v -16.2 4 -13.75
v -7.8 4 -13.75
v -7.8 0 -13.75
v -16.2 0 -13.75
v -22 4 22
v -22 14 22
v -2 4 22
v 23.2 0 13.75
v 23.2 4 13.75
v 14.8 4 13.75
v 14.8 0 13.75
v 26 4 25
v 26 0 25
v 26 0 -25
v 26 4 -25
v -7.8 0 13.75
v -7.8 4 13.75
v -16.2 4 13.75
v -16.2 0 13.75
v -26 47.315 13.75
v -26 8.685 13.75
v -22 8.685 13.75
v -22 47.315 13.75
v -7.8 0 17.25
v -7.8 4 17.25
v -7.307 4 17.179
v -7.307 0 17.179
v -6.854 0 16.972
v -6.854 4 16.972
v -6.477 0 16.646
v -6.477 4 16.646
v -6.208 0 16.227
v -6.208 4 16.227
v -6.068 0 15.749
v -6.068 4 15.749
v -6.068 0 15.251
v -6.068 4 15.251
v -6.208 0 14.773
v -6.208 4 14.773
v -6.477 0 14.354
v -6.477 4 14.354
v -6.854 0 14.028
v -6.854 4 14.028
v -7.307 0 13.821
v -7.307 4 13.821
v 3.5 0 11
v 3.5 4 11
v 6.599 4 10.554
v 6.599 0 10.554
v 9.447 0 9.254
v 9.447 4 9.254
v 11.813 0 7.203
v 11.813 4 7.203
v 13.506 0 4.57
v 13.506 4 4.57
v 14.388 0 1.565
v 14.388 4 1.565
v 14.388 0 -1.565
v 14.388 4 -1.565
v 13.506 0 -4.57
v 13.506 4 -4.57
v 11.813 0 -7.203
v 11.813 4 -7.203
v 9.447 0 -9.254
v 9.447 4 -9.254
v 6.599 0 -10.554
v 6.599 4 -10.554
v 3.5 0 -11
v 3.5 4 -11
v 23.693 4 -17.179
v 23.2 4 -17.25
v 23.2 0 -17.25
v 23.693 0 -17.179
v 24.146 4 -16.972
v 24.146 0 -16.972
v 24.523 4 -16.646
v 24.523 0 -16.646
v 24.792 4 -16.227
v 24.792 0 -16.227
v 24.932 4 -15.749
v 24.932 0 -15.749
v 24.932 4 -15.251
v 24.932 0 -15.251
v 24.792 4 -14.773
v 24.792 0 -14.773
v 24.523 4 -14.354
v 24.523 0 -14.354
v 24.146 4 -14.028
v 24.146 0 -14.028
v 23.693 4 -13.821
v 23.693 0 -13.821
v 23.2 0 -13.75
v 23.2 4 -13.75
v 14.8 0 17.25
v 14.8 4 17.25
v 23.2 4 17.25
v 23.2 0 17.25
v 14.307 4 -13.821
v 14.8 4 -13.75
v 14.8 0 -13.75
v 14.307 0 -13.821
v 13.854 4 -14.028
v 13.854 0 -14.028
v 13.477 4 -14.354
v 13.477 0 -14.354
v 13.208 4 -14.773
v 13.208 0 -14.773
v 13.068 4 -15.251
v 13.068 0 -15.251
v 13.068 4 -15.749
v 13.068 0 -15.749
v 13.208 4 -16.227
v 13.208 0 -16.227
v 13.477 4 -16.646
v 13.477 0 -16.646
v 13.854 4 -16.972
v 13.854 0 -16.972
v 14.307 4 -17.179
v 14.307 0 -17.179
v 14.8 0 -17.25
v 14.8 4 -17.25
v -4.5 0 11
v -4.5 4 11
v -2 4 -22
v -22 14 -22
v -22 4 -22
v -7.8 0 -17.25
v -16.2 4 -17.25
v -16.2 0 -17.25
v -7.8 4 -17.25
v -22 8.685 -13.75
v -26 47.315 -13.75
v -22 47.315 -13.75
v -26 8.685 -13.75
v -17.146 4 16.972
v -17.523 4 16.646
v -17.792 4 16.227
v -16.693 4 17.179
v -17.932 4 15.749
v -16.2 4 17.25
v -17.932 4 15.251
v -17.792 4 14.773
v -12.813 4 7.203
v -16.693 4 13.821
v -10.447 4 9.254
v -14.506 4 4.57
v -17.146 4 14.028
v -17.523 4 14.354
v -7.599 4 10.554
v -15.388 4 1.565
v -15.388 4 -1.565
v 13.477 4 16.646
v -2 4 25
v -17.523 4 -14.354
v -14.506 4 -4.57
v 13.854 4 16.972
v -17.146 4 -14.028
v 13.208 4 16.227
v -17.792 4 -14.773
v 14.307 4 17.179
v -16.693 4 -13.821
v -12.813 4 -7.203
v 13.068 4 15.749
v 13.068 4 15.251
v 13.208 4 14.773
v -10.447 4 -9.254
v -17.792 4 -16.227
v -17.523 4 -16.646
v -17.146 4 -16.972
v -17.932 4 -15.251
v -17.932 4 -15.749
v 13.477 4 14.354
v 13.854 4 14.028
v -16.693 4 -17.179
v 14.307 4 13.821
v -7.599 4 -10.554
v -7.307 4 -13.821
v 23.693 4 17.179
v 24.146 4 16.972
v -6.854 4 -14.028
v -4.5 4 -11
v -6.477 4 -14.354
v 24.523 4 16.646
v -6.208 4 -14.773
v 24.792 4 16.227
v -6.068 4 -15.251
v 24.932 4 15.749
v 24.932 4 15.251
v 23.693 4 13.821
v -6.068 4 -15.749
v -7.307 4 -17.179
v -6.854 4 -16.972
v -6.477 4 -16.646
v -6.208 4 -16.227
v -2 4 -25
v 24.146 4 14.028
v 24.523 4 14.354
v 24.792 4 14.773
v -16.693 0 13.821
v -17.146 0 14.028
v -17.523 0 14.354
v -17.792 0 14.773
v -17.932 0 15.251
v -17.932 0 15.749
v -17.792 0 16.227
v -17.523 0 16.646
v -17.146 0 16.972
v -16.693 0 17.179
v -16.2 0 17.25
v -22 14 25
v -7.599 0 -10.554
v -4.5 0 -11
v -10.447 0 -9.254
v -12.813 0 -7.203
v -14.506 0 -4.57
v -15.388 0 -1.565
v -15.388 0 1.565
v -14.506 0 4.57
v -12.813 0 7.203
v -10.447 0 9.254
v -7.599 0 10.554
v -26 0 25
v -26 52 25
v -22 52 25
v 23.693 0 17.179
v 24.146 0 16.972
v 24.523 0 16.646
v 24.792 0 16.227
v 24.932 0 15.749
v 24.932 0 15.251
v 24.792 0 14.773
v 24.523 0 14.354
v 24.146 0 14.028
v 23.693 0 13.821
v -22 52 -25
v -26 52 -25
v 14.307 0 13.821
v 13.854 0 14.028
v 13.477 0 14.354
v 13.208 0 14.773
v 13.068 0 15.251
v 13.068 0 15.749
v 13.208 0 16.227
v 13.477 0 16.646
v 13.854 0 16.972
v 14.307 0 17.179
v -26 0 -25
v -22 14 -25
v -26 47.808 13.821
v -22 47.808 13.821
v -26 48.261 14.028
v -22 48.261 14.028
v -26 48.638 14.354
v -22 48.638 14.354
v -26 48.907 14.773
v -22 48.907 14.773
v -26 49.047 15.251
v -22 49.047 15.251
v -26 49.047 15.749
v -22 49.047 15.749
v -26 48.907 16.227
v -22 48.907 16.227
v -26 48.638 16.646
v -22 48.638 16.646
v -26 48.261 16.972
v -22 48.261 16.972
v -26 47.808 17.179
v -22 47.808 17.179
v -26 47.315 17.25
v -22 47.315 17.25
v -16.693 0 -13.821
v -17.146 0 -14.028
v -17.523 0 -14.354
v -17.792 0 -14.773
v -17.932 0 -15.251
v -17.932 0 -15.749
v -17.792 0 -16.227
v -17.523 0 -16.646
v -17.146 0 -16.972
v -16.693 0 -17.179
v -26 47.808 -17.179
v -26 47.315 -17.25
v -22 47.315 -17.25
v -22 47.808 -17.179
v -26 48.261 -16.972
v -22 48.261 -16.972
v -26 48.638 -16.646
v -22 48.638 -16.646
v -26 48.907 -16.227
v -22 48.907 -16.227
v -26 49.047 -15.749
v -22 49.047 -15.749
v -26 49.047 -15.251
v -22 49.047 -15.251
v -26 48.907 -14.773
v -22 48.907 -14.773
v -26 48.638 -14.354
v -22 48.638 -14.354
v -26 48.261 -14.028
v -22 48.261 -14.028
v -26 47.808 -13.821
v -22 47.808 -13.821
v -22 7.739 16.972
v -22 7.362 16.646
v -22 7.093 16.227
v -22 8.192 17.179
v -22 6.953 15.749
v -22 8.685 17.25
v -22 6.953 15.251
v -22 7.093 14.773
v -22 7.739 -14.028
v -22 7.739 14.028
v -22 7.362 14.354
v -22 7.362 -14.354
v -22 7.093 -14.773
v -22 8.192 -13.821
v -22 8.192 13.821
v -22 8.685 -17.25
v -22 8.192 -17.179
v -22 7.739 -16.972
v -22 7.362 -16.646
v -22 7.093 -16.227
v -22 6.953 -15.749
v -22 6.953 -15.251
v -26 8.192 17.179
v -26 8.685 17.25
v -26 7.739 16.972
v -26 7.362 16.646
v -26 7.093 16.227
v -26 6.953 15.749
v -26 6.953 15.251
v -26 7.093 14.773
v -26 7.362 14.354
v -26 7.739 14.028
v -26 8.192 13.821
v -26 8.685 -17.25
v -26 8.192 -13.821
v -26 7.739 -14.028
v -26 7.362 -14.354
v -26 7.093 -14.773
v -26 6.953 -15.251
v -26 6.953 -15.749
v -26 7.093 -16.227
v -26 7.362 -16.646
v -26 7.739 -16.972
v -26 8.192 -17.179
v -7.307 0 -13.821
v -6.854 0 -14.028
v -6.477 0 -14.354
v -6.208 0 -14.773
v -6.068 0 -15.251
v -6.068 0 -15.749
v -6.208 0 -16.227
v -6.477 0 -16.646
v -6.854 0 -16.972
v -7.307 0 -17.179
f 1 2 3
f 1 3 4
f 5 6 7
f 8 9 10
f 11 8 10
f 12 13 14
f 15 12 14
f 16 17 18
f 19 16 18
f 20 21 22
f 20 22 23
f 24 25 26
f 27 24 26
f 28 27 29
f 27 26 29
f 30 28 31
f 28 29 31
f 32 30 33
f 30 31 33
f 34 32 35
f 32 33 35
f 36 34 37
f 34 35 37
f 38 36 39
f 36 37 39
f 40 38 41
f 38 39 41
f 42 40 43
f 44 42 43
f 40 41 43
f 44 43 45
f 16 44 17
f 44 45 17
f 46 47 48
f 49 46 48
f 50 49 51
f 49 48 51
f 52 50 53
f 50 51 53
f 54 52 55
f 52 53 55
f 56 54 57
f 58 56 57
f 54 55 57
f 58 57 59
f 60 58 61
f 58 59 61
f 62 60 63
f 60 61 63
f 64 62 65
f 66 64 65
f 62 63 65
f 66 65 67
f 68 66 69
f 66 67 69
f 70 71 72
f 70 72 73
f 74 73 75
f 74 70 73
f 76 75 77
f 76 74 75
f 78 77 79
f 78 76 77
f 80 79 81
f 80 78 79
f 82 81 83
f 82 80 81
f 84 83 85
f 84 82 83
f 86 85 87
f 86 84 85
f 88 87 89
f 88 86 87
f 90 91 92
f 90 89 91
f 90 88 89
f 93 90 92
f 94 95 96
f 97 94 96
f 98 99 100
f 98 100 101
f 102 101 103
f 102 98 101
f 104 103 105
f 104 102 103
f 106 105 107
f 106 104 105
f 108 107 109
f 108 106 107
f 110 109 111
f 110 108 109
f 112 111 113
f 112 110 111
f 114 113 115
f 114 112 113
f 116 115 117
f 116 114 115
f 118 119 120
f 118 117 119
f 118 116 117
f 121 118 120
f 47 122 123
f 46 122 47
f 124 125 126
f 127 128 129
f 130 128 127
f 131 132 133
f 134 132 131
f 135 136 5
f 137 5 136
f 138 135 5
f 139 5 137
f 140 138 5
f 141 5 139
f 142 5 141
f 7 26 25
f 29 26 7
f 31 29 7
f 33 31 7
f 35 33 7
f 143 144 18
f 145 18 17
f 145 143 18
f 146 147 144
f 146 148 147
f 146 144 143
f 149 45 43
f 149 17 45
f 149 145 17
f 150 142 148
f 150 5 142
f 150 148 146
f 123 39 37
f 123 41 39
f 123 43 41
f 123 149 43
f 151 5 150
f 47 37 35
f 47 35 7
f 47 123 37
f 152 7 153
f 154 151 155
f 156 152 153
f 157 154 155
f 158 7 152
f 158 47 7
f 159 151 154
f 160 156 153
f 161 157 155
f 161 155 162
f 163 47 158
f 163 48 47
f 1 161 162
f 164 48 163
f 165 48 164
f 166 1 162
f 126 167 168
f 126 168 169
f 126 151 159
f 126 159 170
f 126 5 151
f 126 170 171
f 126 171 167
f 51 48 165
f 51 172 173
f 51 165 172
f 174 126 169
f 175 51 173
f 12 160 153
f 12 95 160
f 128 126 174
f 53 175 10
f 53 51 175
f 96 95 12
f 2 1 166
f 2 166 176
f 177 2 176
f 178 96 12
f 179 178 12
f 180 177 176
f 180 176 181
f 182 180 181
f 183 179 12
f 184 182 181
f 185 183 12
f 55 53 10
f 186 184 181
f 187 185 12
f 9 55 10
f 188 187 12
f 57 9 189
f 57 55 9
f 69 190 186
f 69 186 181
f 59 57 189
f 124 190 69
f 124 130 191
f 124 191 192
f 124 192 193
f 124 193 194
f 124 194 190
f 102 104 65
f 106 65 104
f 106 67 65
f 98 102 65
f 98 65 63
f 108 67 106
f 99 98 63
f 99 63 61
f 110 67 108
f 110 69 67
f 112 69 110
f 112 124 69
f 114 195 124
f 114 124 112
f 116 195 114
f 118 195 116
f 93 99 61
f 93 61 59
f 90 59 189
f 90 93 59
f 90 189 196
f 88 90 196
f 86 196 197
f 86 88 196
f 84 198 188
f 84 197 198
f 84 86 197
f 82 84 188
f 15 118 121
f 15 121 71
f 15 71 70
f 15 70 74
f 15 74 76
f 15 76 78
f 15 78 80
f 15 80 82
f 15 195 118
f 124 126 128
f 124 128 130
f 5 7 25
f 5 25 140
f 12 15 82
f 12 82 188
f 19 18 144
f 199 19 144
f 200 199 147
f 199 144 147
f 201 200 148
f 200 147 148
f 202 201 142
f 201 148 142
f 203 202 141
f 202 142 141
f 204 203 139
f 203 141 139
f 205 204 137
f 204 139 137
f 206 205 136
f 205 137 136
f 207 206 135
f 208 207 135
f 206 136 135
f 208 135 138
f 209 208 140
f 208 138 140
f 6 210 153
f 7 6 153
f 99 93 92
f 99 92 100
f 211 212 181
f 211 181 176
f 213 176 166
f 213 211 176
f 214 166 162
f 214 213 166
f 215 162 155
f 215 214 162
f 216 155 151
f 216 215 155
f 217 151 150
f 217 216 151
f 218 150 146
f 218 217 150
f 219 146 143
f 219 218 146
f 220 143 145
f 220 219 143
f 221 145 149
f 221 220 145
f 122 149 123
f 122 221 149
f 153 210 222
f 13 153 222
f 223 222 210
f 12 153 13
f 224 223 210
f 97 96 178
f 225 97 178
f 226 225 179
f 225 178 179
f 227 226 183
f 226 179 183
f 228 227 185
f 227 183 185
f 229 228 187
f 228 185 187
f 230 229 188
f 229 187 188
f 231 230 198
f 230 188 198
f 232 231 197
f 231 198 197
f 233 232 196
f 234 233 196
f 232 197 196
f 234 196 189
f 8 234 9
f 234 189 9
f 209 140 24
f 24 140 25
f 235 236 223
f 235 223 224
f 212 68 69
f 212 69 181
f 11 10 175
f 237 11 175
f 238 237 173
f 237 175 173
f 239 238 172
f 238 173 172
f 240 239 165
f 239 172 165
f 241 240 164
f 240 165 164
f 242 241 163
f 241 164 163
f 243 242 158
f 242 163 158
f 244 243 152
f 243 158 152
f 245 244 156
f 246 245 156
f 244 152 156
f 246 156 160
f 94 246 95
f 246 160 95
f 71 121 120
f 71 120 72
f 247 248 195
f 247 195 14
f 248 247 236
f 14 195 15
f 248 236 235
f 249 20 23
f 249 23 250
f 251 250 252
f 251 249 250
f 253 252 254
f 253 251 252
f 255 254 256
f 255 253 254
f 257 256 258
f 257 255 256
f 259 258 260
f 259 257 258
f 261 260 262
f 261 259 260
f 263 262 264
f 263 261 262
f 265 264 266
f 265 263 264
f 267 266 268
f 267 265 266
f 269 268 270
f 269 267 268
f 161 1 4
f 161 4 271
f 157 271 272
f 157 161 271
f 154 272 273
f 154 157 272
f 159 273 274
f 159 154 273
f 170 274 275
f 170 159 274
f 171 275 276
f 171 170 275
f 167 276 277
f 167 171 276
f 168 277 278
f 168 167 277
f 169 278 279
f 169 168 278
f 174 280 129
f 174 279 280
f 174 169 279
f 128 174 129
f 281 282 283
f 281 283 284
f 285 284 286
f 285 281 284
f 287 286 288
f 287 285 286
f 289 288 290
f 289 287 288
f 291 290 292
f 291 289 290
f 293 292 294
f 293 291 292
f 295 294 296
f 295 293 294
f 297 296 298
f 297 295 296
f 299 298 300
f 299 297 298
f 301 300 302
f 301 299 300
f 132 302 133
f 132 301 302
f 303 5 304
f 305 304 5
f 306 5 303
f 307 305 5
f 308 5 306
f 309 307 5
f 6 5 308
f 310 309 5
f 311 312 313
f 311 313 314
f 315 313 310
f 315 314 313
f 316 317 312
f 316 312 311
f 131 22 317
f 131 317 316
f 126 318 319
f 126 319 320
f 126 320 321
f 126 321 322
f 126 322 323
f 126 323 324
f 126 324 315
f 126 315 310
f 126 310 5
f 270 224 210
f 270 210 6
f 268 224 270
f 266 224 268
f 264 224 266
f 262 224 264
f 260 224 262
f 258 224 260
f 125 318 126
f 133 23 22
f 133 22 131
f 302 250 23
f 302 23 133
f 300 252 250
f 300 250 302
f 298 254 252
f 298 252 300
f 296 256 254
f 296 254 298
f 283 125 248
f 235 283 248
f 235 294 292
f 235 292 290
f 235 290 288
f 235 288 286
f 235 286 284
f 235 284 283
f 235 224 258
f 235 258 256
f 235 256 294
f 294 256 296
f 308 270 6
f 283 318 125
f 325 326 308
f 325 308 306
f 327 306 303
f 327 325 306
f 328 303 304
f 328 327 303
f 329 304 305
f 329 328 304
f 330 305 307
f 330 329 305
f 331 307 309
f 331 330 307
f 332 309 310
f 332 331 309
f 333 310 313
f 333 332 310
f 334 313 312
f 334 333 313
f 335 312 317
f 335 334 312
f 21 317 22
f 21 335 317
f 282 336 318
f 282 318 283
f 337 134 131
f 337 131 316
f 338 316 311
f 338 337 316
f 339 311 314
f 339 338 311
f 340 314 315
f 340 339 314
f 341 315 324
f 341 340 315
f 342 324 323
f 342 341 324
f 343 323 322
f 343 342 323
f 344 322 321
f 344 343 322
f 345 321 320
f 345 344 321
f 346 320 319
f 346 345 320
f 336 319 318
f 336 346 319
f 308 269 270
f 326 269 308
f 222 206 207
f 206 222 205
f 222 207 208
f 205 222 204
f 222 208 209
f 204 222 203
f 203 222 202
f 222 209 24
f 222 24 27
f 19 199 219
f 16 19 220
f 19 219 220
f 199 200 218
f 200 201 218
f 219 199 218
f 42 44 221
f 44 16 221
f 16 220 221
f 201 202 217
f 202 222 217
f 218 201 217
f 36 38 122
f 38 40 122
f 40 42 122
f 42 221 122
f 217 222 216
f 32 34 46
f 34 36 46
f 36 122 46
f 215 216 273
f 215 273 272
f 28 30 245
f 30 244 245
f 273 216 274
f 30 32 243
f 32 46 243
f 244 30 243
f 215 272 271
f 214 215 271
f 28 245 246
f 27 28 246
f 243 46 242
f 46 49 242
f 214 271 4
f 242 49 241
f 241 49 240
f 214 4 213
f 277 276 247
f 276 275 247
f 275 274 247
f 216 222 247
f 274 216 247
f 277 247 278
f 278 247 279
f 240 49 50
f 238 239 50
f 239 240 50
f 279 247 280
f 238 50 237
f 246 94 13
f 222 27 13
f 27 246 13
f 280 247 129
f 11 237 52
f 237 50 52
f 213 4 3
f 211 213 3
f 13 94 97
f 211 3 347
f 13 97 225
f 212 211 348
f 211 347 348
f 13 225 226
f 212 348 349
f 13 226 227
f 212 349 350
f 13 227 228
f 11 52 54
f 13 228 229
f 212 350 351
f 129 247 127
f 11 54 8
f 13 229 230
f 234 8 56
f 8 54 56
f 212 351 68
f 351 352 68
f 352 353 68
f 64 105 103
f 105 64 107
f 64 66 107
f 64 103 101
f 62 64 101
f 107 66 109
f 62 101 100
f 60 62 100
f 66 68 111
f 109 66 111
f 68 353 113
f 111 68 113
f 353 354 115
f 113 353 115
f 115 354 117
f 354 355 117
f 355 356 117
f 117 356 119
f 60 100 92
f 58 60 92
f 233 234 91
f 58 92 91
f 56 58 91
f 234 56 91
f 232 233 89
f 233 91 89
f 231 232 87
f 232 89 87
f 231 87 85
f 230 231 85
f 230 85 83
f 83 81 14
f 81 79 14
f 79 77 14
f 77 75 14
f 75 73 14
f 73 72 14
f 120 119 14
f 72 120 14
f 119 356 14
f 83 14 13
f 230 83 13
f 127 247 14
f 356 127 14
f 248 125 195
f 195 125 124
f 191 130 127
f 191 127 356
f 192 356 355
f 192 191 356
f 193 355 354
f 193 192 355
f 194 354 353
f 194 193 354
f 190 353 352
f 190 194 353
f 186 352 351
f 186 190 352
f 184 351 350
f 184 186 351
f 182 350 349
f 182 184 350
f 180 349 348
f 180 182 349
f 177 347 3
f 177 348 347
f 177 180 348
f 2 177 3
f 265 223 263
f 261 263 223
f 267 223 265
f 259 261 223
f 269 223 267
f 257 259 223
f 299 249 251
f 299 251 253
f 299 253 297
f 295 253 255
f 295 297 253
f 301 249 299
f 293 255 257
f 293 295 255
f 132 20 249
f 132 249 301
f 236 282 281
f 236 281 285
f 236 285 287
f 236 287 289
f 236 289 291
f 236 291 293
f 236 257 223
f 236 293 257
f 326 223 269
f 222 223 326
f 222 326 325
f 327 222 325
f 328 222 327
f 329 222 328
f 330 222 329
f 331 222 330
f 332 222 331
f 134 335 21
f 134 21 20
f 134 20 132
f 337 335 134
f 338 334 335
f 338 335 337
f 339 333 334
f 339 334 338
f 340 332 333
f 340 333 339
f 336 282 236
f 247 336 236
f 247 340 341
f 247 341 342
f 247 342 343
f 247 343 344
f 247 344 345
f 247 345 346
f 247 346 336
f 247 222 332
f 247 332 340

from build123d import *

# Parameters (mm, degrees)
SKETCH1_W           = 52
SKETCH1_H           = 50
BOSS_EXTRUDE1_DEPTH = 4
SKETCH2_R           = 1.75
SKETCH2_R_2         = 11
CUT_EXTRUDE1_DEPTH  = 37.290494623
SKETCH3_W           = 4
SKETCH3_H           = 50
BOSS_EXTRUDE3_DEPTH = 48
BOSS_EXTRUDE4_START = -50
SKETCH5_W           = 20
SKETCH5_H           = 10
BOSS_EXTRUDE4_DEPTH = 50
SKETCH7_W           = 20
SKETCH7_H           = 44
CUT_EXTRUDE2_DEPTH  = 10
CUT_EXTRUDE3_DEPTH  = 77.681158051
CUT_EXTRUDE5_DEPTH  = 78.672388917
CUT_EXTRUDE6_DEPTH  = 61.041652209
CUT_EXTRUDE7_DEPTH  = 64.285069329


with BuildPart() as part:
    # Sketch1 → Boss-Extrude1 (new body)
    with BuildSketch(Plane(origin=(0, 0, 0), x_dir=(1, 0, 0), z_dir=(0, 1, 0))):
        Rectangle(SKETCH1_W, SKETCH1_H)
    extrude(amount=BOSS_EXTRUDE1_DEPTH)

    # Sketch2 → Cut-Extrude1 (cut, through all)
    with BuildSketch(Plane(origin=(0, 4, 0), x_dir=(1, 0, 0), z_dir=(0, 1, 0))):
        with Locations(Location((19, 15.5, 0), (0, 0, 270))):
            Circle(SKETCH2_R)
        with Locations(Location((-12, -15.5, 0), (0, 0, 90))):
            Circle(SKETCH2_R)
        with Locations(Location((19, -15.5, 0), (0, 0, 270))):
            Circle(SKETCH2_R)
        with Locations(Location((-12, 15.5, 0), (0, 0, 90))):
            Circle(SKETCH2_R)
        with Locations(Location((3.5, 0, 0), (0, 0, 270))):
            Circle(SKETCH2_R_2)
    extrude(amount=-CUT_EXTRUDE1_DEPTH, mode=Mode.SUBTRACT)

    # Sketch3 → Boss-Extrude3 (add)
    with BuildSketch(Plane(origin=(0, 4, 0), x_dir=(1, 0, 0), z_dir=(0, 1, 0))):
        with Locations((-24, 0)):
            Rectangle(SKETCH3_W, SKETCH3_H)
    extrude(amount=BOSS_EXTRUDE3_DEPTH)

    # Sketch5 → Boss-Extrude4 (add)
    with BuildSketch(Plane.XY.offset(25).offset(BOSS_EXTRUDE4_START)):
        with Locations((-12, 9)):
            Rectangle(SKETCH5_W, SKETCH5_H)
    extrude(amount=BOSS_EXTRUDE4_DEPTH)

    # Sketch7 → Cut-Extrude2 (cut)
    with BuildSketch(Plane(origin=(0, 14, 0), x_dir=(1, 0, 0), z_dir=(0, 1, 0))):
        with Locations((-12, 0)):
            Rectangle(SKETCH7_W, SKETCH7_H)
    extrude(amount=-CUT_EXTRUDE2_DEPTH, mode=Mode.SUBTRACT)

    # Sketch8 → Cut-Extrude3 (cut, through all)
    with BuildSketch(Plane.XY.offset(25)):
        Polygon((-22, 14), (-2, 4), (-2, 14), align=None)
    extrude(amount=-CUT_EXTRUDE3_DEPTH, mode=Mode.SUBTRACT)

    # Sketch9 → Cut-Extrude5 (cut, through all)
    with BuildSketch(Plane.ZY.offset(26)):
        with BuildLine():
            Line((-13.75, 47.315114044), (-13.75, 8.684885956))
            ThreePointArc((-13.75, 8.684885956), (-15.5, 6.934885956), (-17.25, 8.684885956))
            Line((-17.25, 8.684885956), (-17.25, 47.315114044))
            ThreePointArc((-17.25, 47.315114044), (-15.5, 49.065114044), (-13.75, 47.315114044))
        make_face()
        with BuildLine():
            Line((17.25, 47.315114044), (17.25, 8.684885956))
            ThreePointArc((17.25, 8.684885956), (15.5, 6.934885956), (13.75, 8.684885956))
            Line((13.75, 8.684885956), (13.75, 47.315114044))
            ThreePointArc((13.75, 47.315114044), (15.5, 49.065114044), (17.25, 47.315114044))
        make_face()
    extrude(amount=-CUT_EXTRUDE5_DEPTH, mode=Mode.SUBTRACT)

    # Sketch11 → Cut-Extrude6 (cut, through all)
    with BuildSketch(Plane(origin=(0, 4, 0), x_dir=(1, 0, 0), z_dir=(0, 1, 0))):
        with BuildLine():
            Line((-16.2, 17.25), (-7.8, 17.25))
            ThreePointArc((-7.8, 17.25), (-6.05, 15.5), (-7.8, 13.75))
            Line((-7.8, 13.75), (-16.2, 13.75))
            ThreePointArc((-16.2, 13.75), (-17.95, 15.5), (-16.2, 17.25))
        make_face()
        with BuildLine():
            Line((-16.2, -17.25), (-7.8, -17.25))
            ThreePointArc((-7.8, -17.25), (-6.05, -15.5), (-7.8, -13.75))
            Line((-7.8, -13.75), (-16.2, -13.75))
            ThreePointArc((-16.2, -13.75), (-17.95, -15.5), (-16.2, -17.25))
        make_face()
        with BuildLine():
            Line((23.2, 13.75), (14.8, 13.75))
            ThreePointArc((14.8, 13.75), (13.05, 15.5), (14.8, 17.25))
            Line((14.8, 17.25), (23.2, 17.25))
            ThreePointArc((23.2, 17.25), (24.95, 15.5), (23.2, 13.75))
        make_face()
        with BuildLine():
            Line((23.2, -13.75), (14.8, -13.75))
            ThreePointArc((14.8, -13.75), (13.05, -15.5), (14.8, -17.25))
            Line((14.8, -17.25), (23.2, -17.25))
            ThreePointArc((23.2, -17.25), (24.95, -15.5), (23.2, -13.75))
        make_face()
    extrude(amount=-CUT_EXTRUDE6_DEPTH, mode=Mode.SUBTRACT)

    # Sketch12 → Cut-Extrude7 (cut, through all)
    with BuildSketch(Plane.XZ):
        with BuildLine():
            Line((3.5, -11), (-4.5, -11))
            ThreePointArc((-4.5, -11), (-15.5, 0), (-4.5, 11))
            Line((-4.5, 11), (3.5, 11))
            ThreePointArc((3.5, 11), (14.5, 0), (3.5, -11))
        make_face()
    extrude(amount=-CUT_EXTRUDE7_DEPTH, mode=Mode.SUBTRACT)


solid = part.part
